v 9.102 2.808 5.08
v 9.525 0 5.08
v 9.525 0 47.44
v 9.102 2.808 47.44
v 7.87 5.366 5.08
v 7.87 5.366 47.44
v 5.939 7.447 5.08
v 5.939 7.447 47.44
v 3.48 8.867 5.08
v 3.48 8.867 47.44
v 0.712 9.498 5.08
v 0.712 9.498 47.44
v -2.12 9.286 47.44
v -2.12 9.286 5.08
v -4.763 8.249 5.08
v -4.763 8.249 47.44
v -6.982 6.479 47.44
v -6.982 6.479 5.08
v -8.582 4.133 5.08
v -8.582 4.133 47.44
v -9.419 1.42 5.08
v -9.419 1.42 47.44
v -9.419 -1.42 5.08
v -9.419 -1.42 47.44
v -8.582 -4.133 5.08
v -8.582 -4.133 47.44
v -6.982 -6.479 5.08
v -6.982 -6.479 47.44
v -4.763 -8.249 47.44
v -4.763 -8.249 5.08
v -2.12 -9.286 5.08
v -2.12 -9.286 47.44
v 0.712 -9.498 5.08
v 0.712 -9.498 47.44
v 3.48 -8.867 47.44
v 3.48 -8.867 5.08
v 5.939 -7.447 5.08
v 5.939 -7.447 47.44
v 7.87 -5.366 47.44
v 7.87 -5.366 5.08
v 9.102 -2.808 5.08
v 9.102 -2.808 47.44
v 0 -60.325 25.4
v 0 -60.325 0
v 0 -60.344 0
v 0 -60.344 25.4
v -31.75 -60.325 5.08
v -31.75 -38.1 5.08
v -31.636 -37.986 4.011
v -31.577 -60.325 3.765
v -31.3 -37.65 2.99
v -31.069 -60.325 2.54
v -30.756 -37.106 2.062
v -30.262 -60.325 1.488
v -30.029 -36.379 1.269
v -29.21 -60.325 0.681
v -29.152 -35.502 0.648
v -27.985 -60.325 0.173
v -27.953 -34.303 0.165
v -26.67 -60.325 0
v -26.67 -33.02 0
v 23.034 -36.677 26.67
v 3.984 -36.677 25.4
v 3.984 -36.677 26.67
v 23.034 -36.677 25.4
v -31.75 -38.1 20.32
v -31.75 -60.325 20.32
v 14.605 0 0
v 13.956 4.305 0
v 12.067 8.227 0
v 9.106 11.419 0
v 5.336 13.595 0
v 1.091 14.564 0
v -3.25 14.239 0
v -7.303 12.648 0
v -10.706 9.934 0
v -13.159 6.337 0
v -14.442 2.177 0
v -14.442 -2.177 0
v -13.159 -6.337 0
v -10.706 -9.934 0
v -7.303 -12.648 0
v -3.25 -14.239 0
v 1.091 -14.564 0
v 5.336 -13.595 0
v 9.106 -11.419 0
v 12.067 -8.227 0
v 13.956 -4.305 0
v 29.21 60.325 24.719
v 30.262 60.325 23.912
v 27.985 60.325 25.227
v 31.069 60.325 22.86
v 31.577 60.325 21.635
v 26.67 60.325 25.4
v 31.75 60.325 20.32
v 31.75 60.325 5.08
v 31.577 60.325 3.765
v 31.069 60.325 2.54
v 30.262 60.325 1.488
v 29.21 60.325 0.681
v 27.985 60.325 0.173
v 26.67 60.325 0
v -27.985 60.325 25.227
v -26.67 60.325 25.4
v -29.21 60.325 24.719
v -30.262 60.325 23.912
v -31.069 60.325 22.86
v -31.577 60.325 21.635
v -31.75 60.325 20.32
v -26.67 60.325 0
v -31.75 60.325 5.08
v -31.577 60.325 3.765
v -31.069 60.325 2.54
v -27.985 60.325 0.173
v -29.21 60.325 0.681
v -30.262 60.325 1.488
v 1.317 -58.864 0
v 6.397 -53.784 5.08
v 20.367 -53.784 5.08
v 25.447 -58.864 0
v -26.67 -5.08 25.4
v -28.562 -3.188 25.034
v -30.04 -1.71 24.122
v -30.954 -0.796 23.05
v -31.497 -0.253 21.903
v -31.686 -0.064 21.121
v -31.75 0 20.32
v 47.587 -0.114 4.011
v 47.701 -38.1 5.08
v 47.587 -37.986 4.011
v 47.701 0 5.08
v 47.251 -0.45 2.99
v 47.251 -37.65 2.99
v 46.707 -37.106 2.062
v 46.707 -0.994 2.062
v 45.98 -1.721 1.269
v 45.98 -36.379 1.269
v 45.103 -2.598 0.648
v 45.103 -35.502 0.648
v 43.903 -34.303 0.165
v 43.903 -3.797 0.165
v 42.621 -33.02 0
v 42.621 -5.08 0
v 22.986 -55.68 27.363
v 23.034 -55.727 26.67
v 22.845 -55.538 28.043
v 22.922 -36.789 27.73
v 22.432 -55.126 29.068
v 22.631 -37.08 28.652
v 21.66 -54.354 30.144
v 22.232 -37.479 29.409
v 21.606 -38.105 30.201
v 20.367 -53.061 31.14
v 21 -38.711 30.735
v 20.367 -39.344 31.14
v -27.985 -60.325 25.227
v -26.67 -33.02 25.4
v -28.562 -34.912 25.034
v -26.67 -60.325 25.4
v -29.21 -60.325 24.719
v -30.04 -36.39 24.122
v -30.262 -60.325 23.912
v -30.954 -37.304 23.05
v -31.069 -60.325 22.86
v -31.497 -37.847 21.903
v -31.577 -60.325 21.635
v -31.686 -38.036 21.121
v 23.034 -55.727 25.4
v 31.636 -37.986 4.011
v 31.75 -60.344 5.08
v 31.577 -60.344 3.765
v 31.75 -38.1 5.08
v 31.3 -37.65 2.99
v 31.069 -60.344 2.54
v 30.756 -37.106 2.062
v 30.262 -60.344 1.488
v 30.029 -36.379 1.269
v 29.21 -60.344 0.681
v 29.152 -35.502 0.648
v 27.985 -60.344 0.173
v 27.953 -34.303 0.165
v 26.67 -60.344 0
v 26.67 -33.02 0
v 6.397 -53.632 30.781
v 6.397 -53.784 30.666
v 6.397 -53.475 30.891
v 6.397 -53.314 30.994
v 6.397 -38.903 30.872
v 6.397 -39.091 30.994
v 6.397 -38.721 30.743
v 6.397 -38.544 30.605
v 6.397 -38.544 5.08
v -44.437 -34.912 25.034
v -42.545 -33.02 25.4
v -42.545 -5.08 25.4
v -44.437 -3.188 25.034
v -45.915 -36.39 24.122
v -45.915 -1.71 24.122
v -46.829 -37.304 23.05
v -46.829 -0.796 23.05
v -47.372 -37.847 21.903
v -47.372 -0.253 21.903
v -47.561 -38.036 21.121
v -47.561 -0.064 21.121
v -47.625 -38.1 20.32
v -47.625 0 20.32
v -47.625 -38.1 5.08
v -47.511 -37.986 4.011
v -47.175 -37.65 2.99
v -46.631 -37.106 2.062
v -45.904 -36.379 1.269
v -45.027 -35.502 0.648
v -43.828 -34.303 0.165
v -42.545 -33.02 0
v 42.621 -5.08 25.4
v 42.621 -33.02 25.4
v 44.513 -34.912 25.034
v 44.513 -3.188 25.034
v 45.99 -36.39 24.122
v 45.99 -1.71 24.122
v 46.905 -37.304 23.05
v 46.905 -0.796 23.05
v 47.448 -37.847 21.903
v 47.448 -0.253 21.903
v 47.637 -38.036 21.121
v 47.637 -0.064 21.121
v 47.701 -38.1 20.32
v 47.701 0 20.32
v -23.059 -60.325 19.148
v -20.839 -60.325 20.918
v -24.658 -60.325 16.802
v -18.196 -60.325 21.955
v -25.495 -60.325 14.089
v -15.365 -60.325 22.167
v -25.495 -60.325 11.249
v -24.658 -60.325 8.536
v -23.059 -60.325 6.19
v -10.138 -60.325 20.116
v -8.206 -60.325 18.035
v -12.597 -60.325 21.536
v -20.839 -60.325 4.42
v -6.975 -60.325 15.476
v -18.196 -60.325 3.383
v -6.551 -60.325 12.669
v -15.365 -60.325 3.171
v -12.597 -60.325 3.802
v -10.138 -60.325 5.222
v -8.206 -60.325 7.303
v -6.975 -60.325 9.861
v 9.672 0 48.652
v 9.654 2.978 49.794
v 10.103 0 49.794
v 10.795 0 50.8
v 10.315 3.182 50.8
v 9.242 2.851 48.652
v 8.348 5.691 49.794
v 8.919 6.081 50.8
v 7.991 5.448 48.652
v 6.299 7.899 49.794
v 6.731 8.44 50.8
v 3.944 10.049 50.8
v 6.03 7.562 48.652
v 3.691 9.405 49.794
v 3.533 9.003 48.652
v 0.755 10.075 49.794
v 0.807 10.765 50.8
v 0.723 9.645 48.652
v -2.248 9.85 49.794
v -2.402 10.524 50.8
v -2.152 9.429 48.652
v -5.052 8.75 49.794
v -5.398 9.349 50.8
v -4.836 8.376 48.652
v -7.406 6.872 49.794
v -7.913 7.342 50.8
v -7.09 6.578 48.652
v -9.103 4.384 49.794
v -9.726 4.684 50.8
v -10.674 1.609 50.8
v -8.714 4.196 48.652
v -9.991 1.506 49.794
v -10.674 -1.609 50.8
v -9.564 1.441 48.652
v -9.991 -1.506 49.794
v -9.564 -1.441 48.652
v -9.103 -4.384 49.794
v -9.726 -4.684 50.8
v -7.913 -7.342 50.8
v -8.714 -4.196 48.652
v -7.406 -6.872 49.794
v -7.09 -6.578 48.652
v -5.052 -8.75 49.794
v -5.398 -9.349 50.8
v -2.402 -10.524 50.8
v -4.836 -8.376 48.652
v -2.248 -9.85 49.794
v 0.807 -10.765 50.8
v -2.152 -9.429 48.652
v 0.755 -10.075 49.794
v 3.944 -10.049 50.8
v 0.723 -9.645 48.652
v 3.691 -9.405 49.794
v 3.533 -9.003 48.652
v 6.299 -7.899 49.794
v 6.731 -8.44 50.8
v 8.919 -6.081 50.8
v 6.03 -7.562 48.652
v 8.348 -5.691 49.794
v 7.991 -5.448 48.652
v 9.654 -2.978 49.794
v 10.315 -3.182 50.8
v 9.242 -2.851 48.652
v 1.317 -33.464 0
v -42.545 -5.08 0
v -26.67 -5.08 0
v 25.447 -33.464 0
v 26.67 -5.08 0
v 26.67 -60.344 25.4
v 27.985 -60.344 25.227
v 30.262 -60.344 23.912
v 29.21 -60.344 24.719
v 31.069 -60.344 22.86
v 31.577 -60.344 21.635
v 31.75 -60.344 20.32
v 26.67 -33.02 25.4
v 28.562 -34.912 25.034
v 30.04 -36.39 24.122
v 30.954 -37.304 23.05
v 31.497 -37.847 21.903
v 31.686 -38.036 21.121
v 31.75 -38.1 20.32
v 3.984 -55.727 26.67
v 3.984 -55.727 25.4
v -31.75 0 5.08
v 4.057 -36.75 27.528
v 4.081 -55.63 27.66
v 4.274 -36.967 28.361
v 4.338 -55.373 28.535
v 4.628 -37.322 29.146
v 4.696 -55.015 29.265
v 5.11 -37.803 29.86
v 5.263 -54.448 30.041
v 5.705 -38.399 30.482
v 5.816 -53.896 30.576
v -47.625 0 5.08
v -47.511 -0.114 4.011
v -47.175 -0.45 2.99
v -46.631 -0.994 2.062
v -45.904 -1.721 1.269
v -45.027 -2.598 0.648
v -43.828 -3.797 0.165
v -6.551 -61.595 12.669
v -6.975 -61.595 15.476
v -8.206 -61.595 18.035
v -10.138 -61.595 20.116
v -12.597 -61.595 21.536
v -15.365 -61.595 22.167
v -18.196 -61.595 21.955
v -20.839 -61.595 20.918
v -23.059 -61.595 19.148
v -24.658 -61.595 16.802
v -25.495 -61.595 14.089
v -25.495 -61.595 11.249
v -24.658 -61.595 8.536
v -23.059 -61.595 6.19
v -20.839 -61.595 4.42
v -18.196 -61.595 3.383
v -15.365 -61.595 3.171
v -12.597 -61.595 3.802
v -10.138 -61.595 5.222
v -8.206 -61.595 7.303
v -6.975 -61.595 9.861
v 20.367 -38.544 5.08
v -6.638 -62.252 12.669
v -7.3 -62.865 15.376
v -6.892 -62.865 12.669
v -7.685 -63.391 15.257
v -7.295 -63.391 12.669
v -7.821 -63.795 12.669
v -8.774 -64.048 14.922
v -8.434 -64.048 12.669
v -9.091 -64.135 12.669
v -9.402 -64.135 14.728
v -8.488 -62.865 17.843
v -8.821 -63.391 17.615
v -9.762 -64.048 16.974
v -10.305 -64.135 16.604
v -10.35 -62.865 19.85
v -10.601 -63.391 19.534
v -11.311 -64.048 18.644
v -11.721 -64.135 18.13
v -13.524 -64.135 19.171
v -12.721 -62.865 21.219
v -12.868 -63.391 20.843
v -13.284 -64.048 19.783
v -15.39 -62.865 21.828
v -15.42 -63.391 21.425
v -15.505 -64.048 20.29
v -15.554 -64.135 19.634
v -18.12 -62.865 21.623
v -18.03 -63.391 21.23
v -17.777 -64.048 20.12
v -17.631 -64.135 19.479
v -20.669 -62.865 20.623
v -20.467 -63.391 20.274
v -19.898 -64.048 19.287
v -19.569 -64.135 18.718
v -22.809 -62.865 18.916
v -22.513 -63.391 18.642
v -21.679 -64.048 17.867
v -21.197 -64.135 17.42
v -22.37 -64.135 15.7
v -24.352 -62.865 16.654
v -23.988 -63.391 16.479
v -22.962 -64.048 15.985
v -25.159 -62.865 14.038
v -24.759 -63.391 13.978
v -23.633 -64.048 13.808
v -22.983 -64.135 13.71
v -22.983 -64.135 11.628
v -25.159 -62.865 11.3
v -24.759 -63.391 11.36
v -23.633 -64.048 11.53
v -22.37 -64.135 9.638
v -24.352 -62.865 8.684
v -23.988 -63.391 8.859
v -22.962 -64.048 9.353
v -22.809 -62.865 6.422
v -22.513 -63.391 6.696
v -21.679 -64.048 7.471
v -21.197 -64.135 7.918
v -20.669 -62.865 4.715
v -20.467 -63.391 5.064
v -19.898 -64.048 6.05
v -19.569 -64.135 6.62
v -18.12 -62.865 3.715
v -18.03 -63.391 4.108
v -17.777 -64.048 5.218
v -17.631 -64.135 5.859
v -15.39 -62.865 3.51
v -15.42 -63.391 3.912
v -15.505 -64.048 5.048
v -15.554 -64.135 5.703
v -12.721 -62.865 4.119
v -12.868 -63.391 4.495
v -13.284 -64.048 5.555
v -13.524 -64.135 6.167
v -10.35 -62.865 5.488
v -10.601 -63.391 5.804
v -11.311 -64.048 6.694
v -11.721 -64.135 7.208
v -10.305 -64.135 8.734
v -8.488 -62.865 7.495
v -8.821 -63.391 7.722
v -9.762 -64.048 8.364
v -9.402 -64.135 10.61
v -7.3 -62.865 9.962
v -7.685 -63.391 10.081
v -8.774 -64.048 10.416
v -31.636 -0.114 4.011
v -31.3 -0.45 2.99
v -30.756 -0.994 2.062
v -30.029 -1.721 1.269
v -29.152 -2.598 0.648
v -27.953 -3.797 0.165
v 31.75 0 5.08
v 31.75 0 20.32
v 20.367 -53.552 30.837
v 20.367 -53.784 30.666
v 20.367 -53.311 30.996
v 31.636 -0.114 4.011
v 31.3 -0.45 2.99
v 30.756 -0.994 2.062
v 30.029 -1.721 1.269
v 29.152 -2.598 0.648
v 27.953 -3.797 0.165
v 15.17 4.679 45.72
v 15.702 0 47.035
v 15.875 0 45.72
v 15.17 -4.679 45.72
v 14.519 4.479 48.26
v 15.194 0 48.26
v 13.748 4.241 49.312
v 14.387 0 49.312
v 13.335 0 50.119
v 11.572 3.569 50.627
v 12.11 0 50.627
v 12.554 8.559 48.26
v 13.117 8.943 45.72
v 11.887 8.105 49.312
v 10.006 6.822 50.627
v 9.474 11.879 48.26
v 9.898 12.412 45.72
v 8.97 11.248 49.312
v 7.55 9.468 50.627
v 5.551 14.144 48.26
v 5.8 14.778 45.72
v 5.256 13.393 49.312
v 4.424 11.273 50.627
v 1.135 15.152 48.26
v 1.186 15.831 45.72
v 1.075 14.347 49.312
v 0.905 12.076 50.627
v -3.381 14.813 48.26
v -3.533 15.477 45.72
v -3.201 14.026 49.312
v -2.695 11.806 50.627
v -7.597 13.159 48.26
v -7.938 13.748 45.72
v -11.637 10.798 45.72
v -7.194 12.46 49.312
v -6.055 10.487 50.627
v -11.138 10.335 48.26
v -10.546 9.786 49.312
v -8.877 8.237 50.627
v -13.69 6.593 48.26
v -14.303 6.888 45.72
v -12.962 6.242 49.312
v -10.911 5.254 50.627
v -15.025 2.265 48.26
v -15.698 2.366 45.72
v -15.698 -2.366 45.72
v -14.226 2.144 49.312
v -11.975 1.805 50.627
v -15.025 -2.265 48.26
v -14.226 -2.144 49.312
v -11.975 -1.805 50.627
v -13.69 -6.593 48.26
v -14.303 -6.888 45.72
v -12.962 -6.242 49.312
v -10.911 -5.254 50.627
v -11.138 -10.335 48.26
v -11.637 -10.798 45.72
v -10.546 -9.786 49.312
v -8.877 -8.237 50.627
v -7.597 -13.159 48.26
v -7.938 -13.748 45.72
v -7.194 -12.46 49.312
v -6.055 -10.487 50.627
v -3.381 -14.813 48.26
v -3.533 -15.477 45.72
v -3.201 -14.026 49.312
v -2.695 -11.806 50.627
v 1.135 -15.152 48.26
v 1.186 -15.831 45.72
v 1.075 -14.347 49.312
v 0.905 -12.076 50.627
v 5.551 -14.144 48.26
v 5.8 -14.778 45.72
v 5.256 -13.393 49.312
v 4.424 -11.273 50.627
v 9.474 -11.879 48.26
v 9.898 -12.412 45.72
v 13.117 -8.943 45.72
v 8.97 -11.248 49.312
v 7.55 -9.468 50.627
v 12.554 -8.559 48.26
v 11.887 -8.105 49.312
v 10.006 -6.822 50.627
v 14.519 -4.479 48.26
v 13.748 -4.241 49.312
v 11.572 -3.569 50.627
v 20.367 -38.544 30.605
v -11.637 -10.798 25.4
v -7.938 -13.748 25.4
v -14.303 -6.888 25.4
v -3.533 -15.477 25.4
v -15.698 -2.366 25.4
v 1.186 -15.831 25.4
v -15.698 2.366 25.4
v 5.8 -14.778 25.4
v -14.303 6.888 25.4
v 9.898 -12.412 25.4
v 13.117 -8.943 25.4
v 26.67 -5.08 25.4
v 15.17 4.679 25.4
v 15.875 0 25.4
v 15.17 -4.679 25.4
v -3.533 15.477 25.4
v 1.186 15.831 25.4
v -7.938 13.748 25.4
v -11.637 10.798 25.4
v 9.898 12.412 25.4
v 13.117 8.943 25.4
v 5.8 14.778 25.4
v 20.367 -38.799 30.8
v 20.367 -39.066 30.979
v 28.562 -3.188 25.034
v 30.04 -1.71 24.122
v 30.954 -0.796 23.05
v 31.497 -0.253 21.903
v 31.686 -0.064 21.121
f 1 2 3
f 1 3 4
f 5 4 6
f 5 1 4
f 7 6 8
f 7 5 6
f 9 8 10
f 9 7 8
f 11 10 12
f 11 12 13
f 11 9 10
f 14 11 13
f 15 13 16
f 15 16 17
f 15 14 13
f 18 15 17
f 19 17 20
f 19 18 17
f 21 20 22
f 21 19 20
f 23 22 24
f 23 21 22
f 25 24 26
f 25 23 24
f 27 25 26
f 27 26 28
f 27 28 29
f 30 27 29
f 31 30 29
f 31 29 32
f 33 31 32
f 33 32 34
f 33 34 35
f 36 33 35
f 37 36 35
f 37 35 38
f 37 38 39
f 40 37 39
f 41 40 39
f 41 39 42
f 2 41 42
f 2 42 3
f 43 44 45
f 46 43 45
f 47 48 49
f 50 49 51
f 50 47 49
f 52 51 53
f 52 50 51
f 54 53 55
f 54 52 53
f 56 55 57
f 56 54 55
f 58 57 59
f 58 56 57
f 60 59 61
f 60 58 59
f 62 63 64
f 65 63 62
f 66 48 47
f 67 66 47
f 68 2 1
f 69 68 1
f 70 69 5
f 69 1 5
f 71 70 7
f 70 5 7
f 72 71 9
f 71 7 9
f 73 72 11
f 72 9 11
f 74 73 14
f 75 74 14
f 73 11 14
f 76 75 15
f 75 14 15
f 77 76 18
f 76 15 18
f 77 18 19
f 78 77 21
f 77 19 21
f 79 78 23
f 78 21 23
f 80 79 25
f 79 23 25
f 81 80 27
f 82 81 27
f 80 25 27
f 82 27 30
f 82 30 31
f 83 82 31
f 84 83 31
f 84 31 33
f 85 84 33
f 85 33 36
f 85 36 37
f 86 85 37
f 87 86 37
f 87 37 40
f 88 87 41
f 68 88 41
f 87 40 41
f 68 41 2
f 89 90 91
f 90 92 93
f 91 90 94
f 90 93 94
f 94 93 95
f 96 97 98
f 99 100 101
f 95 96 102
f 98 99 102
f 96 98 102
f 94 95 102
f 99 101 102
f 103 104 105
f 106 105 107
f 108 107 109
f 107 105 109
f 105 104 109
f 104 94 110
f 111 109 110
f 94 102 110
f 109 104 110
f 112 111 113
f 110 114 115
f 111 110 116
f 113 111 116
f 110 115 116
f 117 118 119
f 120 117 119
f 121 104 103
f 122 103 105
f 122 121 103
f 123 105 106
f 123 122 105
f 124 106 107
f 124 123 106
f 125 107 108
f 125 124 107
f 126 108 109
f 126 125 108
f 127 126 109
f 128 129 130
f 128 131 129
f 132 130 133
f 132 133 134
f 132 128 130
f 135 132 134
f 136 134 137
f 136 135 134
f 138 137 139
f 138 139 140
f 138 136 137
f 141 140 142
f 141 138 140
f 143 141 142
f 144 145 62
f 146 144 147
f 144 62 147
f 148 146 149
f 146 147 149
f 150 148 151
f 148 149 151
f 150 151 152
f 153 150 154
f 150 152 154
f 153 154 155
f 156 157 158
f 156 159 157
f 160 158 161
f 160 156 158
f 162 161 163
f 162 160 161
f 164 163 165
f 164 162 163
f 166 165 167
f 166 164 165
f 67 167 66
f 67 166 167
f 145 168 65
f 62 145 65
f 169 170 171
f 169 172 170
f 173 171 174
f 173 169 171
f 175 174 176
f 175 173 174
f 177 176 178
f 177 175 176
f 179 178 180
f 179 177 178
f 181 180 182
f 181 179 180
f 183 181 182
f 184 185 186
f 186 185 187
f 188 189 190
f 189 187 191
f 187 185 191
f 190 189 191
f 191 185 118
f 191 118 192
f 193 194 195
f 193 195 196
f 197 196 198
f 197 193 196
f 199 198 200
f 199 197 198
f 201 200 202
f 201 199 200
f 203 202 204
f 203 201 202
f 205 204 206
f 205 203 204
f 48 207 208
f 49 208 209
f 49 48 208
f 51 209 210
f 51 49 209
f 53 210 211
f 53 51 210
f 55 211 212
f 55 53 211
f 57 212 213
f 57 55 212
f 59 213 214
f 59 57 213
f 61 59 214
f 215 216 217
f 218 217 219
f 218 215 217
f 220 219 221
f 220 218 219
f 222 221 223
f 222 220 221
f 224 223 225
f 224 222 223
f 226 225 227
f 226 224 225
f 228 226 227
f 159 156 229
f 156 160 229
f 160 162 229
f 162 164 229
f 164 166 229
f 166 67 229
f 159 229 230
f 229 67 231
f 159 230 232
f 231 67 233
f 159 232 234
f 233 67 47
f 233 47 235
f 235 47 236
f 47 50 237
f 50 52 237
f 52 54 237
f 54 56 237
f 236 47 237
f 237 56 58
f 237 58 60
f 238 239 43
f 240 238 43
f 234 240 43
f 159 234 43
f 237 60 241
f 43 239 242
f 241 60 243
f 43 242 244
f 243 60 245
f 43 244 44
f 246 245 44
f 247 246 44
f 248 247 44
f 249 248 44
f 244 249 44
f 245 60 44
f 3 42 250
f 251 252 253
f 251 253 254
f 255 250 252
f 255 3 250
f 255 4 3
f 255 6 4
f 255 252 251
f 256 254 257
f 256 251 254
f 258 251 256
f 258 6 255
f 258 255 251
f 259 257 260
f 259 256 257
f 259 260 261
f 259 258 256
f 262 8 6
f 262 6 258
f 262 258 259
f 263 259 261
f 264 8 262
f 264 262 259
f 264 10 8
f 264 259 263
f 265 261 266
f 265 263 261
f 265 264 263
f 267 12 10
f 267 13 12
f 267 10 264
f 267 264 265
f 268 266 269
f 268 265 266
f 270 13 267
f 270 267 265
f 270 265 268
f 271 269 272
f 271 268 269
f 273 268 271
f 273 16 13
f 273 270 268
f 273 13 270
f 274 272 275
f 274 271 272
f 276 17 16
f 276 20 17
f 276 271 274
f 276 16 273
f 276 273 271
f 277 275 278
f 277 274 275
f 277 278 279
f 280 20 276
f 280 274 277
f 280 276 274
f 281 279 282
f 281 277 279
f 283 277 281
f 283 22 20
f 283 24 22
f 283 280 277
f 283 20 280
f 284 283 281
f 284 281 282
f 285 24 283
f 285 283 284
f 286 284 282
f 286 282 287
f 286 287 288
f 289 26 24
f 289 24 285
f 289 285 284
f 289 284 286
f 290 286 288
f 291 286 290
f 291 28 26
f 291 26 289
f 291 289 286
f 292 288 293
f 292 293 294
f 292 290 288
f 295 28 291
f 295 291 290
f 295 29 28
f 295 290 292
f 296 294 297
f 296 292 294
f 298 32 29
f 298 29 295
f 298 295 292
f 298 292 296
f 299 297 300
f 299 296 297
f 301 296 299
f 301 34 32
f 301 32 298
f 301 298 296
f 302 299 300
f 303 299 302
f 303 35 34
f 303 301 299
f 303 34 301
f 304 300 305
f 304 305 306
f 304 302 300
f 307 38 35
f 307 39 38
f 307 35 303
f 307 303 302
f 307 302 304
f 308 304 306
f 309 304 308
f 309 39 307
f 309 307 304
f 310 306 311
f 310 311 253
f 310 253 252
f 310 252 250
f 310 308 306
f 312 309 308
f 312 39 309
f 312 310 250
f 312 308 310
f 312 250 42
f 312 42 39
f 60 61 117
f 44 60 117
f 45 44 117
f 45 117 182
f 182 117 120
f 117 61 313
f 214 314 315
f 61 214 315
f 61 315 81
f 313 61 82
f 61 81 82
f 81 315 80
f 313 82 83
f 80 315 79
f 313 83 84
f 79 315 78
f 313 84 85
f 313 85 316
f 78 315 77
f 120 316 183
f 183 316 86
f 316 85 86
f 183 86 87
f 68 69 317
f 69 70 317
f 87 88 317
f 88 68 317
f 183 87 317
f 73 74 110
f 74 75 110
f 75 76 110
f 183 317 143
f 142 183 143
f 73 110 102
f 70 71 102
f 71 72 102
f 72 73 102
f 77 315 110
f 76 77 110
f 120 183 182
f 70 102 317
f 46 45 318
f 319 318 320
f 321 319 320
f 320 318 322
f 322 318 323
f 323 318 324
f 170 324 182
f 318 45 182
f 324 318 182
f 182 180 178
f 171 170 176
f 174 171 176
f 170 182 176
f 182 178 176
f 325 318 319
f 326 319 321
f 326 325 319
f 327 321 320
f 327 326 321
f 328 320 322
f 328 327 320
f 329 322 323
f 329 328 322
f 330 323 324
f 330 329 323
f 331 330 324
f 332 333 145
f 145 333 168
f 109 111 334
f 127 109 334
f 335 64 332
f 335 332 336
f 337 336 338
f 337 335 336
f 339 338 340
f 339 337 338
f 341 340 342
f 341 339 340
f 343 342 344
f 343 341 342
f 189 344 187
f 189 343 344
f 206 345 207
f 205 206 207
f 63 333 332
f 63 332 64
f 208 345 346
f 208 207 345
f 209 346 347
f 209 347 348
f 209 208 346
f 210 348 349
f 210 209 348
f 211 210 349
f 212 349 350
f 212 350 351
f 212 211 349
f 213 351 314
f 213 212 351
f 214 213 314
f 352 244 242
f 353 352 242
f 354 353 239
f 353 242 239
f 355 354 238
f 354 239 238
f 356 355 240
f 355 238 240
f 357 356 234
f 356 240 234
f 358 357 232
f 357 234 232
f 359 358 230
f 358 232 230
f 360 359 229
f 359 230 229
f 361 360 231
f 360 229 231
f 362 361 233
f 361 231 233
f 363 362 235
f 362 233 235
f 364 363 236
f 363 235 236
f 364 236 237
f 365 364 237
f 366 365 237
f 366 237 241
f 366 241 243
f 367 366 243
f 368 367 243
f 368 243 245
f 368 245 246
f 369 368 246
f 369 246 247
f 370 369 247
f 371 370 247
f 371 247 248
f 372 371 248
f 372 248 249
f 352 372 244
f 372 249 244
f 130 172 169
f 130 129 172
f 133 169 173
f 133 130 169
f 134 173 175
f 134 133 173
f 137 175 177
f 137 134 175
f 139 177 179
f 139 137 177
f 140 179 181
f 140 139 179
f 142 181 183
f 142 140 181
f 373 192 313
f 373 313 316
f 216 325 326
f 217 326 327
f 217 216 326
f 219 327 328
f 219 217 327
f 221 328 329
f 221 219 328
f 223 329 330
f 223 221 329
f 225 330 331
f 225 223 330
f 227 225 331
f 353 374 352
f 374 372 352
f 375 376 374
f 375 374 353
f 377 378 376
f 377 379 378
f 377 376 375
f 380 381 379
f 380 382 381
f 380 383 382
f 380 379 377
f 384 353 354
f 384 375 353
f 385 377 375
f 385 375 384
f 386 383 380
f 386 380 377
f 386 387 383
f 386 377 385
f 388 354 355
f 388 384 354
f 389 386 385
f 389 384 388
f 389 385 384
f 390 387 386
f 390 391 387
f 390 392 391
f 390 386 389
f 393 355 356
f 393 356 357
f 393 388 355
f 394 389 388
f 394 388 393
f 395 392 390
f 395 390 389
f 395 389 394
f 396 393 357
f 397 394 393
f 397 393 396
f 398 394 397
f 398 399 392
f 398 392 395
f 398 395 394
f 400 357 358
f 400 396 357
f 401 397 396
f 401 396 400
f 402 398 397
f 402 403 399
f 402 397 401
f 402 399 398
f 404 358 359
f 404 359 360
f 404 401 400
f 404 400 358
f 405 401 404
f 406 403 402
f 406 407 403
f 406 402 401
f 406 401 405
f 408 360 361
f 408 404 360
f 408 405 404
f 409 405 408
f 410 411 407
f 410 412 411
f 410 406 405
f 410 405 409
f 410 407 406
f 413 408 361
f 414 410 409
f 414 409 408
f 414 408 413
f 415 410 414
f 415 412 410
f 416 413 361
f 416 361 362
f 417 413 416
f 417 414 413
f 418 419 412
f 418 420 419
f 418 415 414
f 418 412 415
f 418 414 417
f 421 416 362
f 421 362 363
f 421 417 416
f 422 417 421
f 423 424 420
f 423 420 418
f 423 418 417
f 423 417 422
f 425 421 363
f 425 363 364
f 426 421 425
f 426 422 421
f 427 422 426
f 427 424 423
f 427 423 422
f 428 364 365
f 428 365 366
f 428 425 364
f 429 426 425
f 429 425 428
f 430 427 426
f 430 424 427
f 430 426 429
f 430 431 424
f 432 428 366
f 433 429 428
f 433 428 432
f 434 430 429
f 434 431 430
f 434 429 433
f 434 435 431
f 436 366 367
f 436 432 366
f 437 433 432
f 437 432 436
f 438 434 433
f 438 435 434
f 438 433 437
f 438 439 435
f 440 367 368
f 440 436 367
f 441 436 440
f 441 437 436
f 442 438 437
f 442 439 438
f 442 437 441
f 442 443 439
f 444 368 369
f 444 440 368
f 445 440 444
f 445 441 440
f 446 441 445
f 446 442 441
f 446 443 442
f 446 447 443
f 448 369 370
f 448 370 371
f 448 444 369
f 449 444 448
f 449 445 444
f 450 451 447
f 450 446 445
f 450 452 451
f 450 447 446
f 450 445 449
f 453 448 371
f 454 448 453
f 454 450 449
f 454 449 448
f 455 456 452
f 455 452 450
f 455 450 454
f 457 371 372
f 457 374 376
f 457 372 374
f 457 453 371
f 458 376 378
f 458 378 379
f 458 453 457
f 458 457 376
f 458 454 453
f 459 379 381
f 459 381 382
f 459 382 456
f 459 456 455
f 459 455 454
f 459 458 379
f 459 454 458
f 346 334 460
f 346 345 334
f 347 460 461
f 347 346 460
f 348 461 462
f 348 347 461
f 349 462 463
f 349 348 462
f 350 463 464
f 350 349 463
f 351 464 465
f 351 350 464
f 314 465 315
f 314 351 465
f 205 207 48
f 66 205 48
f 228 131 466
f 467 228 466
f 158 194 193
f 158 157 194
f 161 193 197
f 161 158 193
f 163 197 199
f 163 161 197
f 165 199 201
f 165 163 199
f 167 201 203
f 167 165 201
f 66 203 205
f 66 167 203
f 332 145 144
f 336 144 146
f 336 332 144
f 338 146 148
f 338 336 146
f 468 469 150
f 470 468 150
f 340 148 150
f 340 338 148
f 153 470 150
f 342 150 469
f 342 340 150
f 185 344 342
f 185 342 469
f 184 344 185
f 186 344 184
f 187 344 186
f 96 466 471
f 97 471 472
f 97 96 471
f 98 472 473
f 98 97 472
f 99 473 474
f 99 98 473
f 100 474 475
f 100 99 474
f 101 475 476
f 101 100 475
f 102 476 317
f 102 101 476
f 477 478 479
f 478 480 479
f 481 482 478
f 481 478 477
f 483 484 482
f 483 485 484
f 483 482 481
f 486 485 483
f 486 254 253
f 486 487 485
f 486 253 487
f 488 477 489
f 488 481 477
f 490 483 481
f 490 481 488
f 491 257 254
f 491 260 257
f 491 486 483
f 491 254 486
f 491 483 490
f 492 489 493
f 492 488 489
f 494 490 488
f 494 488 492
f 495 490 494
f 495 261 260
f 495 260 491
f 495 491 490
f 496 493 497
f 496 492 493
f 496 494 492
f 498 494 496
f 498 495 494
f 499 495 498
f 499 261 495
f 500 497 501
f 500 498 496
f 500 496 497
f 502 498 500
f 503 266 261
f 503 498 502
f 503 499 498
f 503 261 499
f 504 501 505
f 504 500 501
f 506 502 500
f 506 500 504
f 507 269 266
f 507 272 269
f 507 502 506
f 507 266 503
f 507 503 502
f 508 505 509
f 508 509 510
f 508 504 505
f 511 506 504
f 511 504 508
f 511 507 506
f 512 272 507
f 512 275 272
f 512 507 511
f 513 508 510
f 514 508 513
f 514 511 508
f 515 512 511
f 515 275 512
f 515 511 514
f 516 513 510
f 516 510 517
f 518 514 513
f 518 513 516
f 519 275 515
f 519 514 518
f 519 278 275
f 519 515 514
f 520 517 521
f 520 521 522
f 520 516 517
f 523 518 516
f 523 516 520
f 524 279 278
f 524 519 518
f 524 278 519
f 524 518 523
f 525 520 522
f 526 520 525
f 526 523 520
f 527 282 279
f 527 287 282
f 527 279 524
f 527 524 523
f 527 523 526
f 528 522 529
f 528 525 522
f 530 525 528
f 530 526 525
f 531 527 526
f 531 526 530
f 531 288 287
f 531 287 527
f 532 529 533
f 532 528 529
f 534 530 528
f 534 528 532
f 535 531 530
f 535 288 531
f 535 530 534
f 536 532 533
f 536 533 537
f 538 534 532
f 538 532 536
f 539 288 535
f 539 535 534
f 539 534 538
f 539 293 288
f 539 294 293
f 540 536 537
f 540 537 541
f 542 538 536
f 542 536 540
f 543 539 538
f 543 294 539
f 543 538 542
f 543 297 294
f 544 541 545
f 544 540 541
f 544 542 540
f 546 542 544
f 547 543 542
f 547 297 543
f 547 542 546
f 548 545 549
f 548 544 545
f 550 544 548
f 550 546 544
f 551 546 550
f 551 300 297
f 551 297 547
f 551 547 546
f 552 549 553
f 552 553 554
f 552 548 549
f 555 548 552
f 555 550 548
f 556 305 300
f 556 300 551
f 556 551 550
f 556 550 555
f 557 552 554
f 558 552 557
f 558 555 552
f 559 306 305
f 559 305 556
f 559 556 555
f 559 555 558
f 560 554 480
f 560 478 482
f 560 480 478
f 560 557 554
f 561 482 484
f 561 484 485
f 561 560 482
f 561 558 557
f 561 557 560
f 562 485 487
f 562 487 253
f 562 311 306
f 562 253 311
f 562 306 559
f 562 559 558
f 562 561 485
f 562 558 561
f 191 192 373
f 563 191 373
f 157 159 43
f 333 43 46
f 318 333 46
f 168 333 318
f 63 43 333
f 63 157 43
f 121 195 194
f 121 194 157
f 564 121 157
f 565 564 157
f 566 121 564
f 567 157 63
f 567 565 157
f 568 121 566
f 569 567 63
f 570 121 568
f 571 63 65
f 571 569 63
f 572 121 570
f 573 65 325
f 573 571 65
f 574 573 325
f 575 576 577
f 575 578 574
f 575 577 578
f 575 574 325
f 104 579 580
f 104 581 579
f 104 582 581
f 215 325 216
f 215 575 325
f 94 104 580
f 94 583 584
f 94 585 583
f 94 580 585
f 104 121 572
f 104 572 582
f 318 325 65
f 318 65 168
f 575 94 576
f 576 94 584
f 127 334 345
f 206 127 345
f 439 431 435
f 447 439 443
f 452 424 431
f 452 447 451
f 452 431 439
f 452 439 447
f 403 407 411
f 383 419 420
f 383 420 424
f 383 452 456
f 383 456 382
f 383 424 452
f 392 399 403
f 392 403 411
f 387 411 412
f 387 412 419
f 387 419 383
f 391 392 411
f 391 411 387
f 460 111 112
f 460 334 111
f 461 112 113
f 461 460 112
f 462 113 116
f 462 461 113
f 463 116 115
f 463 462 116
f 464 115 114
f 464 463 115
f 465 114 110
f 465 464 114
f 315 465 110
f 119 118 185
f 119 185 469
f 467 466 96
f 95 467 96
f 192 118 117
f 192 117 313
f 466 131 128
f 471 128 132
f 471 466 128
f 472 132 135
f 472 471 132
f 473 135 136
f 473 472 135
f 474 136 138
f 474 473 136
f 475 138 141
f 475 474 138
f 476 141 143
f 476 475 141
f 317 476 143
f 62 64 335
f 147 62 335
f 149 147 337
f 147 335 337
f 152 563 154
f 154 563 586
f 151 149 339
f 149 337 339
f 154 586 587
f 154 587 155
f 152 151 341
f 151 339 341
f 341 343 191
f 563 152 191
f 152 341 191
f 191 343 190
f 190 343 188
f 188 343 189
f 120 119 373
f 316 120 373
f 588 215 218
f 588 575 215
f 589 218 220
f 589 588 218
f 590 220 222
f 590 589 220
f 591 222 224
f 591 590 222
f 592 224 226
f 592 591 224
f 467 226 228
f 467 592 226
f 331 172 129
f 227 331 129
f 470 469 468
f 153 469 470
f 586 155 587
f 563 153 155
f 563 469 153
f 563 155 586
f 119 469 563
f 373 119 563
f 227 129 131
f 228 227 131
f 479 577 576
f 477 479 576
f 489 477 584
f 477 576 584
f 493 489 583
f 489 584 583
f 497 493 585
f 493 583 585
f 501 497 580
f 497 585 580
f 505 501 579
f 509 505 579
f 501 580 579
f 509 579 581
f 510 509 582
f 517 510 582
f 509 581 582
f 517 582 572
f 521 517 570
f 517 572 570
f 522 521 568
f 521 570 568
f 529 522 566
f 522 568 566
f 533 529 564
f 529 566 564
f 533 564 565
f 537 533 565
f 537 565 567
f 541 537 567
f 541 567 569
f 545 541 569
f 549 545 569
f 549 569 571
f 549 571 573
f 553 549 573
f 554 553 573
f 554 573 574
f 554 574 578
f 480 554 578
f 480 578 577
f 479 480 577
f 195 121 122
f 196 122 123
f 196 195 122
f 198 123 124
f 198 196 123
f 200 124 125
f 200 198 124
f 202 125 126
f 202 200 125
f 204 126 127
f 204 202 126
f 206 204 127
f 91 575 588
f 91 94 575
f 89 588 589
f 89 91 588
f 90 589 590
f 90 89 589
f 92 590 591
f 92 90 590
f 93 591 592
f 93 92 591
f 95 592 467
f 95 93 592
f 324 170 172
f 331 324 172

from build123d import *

# Parameters (mm, degrees)
F0_W        = 19.05
F0_H        = 19.05
F0_R        = 15.875
F1_DEPTH    = 25.4
F0_R_2      = 9.525
F2_DEPTH    = 50.8
F0_W_2      = 13.97
F0_H_2      = 15.24
F3_DEPTH    = 31.75
F4_R        = 9.525
F5_DEPTH    = 3.81
F6_R        = 2.54
F7_R        = 5.08
F9_T1_DEPTH = 44.45
F9_T3_DEPTH = 44.45
F10_R       = 5.08
F11_SIZE    = 5.08
F12_SIZE    = 5.08


# Not quite as in the source:
# - a fillet or chamfer that OpenCascade refuses, or shapes differently, is made with other operations: its cross-section is extruded or revolved along the edge and cut away or added


with BuildPart() as f1:
    # F0 (on Top) → F1 (new body)
    with BuildSketch(Plane.XY):
        Polygon((31.75, 60.325), (0, 60.325), (-31.75, 60.325), (-31.75, 0), (-47.625, 0), (-47.625, -38.1), (-31.75, -38.1), (-31.75, -60.325), (0, -60.325), (0, -60.3444650769), (31.75, -60.3444650769), (31.75, -38.1), (47.7005839348, -38.1), (47.7005839348, 0), (47.625, 0), (31.75, 0), align=None)
        with Locations((13.5087583899, -46.2022918522)):
            Rectangle(F0_W, F0_H, mode=Mode.SUBTRACT)
        Circle(F0_R, mode=Mode.SUBTRACT)
    extrude(amount=F1_DEPTH)

    # F0 (on Top) → F2 (join)
    with BuildSketch(Plane.XY):
        Circle(F0_R)
        Circle(F0_R_2, mode=Mode.SUBTRACT)
    extrude(amount=F2_DEPTH)

    # F0 (on Top) → F3 (join)
    with BuildSketch(Plane.XY):
        with Locations((13.5087583899, -46.2022918522)):
            Rectangle(F0_W, F0_H)
        with Locations((13.3824522054, -46.1642474878)):
            Rectangle(F0_W_2, F0_H_2, mode=Mode.SUBTRACT)
    extrude(amount=F3_DEPTH)

    # F4 (on face) → F5 (join)
    with BuildSketch(Plane.XZ.offset(60.325)):
        with Locations((-16.0763879821, 12.6689534055)):
            Circle(F4_R)
    extrude(amount=F5_DEPTH)

    # F6
    f6_edges = [f1.edges().sort_by_distance(p)[0] for p in [
        (-25.601388, -64.135, 12.668953),
    ]]
    fillet(f6_edges, radius=F6_R)

    # F7
    f7_edges = [f1.edges().sort_by_distance(p)[0] for p in [
        (-15.875, 0, 50.8),
    ]]
    fillet(f7_edges, radius=F7_R)

    # F8: fillet of radius 5.08 on 1 edges, made by hand

    # F8_s1 → F8_t2 (revolve, cut)
    with BuildSketch(Plane.XZ):
        with BuildLine():
            ThreePointArc((10.795, 50.8), (9.8530951188, 49.2359470592), (9.525, 47.4398958349))
            Line((9.525, 47.4398958349), (9.525, 50.8))
            Line((9.525, 50.8), (10.795, 50.8))
        make_face()
    revolve(axis=Axis((0, 0, 50.8), (0, 0, 1)), mode=Mode.SUBTRACT)

    # F9: fillet of radius 5.08 on 4 edges, made by hand

    # F9_s2 → F9_t1 (cut)
    with BuildSketch(Plane.XZ.offset(23.9772918522)):
        with BuildLine():
            ThreePointArc((3.9837583899, 26.67), (5.4716559415, 30.2621024484), (9.0637583899, 31.75))
            Line((9.0637583899, 31.75), (3.9837583899, 31.75))
            Line((3.9837583899, 31.75), (3.9837583899, 26.67))
        make_face()
        with BuildLine():
            ThreePointArc((23.0337583899, 26.67), (21.5458608384, 30.2621024484), (17.9537583899, 31.75))
            Line((17.9537583899, 31.75), (23.0337583899, 31.75))
            Line((23.0337583899, 31.75), (23.0337583899, 26.67))
        make_face()
    extrude(amount=F9_T1_DEPTH, mode=Mode.SUBTRACT)

    # F9_s4 → F9_t3 (cut)
    with BuildSketch(Plane.YZ.offset(-8.7162416101)):
        with BuildLine():
            ThreePointArc((-36.6772918522, 26.67), (-38.1651894038, 30.2621024484), (-41.7572918522, 31.75))
            Line((-41.7572918522, 31.75), (-36.6772918522, 31.75))
            Line((-36.6772918522, 31.75), (-36.6772918522, 26.67))
        make_face()
        with BuildLine():
            ThreePointArc((-55.7272918522, 26.67), (-54.2393943007, 30.2621024484), (-50.6472918522, 31.75))
            Line((-50.6472918522, 31.75), (-55.7272918522, 31.75))
            Line((-55.7272918522, 31.75), (-55.7272918522, 26.67))
        make_face()
    extrude(amount=F9_T3_DEPTH, mode=Mode.SUBTRACT)

    # F10
    f10_edges = [f1.edges().sort_by_distance(p)[0] for p in [
        (39.725292, -38.1, 25.4),
        (31.75, -49.222233, 25.4),
        (-31.75, -49.2125, 25.4),
        (-39.6875, -38.1, 25.4),
        (-31.75, 30.1625, 25.4),
        (-39.6875, 0, 25.4),
        (39.725292, 0, 25.4),
        (31.75, 30.1625, 25.4),
        (-31.75, -49.2125, 0),
        (-31.75, 30.1625, 0),
        (-39.6875, 0, 0),
        (-39.6875, -38.1, 0),
        (-47.625, -19.05, 0),
        (31.75, 30.1625, 0),
        (31.75, -49.222233, 0),
        (39.725292, -38.1, 0),
        (47.700584, -19.05, 0),
        (39.725292, 0, 0),
        (47.700584, -19.05, 25.4),
        (-47.625, -19.05, 25.4),
    ]]
    fillet(f10_edges, radius=F10_R)

    # F11
    f11_edges = [f1.edges().sort_by_distance(p)[0] for p in [
        (13.382452, -38.544247, 0),
        (20.367452, -46.164247, 0),
        (13.382452, -53.784247, 0),
        (6.397452, -46.164247, 0),
    ]]
    chamfer(f11_edges, length=F11_SIZE)

    # F12
    f12_edges = [f1.edges().sort_by_distance(p)[0] for p in [
        (-9.525, 0, 0),
    ]]
    chamfer(f12_edges, length=F12_SIZE)


solid = f1.part
